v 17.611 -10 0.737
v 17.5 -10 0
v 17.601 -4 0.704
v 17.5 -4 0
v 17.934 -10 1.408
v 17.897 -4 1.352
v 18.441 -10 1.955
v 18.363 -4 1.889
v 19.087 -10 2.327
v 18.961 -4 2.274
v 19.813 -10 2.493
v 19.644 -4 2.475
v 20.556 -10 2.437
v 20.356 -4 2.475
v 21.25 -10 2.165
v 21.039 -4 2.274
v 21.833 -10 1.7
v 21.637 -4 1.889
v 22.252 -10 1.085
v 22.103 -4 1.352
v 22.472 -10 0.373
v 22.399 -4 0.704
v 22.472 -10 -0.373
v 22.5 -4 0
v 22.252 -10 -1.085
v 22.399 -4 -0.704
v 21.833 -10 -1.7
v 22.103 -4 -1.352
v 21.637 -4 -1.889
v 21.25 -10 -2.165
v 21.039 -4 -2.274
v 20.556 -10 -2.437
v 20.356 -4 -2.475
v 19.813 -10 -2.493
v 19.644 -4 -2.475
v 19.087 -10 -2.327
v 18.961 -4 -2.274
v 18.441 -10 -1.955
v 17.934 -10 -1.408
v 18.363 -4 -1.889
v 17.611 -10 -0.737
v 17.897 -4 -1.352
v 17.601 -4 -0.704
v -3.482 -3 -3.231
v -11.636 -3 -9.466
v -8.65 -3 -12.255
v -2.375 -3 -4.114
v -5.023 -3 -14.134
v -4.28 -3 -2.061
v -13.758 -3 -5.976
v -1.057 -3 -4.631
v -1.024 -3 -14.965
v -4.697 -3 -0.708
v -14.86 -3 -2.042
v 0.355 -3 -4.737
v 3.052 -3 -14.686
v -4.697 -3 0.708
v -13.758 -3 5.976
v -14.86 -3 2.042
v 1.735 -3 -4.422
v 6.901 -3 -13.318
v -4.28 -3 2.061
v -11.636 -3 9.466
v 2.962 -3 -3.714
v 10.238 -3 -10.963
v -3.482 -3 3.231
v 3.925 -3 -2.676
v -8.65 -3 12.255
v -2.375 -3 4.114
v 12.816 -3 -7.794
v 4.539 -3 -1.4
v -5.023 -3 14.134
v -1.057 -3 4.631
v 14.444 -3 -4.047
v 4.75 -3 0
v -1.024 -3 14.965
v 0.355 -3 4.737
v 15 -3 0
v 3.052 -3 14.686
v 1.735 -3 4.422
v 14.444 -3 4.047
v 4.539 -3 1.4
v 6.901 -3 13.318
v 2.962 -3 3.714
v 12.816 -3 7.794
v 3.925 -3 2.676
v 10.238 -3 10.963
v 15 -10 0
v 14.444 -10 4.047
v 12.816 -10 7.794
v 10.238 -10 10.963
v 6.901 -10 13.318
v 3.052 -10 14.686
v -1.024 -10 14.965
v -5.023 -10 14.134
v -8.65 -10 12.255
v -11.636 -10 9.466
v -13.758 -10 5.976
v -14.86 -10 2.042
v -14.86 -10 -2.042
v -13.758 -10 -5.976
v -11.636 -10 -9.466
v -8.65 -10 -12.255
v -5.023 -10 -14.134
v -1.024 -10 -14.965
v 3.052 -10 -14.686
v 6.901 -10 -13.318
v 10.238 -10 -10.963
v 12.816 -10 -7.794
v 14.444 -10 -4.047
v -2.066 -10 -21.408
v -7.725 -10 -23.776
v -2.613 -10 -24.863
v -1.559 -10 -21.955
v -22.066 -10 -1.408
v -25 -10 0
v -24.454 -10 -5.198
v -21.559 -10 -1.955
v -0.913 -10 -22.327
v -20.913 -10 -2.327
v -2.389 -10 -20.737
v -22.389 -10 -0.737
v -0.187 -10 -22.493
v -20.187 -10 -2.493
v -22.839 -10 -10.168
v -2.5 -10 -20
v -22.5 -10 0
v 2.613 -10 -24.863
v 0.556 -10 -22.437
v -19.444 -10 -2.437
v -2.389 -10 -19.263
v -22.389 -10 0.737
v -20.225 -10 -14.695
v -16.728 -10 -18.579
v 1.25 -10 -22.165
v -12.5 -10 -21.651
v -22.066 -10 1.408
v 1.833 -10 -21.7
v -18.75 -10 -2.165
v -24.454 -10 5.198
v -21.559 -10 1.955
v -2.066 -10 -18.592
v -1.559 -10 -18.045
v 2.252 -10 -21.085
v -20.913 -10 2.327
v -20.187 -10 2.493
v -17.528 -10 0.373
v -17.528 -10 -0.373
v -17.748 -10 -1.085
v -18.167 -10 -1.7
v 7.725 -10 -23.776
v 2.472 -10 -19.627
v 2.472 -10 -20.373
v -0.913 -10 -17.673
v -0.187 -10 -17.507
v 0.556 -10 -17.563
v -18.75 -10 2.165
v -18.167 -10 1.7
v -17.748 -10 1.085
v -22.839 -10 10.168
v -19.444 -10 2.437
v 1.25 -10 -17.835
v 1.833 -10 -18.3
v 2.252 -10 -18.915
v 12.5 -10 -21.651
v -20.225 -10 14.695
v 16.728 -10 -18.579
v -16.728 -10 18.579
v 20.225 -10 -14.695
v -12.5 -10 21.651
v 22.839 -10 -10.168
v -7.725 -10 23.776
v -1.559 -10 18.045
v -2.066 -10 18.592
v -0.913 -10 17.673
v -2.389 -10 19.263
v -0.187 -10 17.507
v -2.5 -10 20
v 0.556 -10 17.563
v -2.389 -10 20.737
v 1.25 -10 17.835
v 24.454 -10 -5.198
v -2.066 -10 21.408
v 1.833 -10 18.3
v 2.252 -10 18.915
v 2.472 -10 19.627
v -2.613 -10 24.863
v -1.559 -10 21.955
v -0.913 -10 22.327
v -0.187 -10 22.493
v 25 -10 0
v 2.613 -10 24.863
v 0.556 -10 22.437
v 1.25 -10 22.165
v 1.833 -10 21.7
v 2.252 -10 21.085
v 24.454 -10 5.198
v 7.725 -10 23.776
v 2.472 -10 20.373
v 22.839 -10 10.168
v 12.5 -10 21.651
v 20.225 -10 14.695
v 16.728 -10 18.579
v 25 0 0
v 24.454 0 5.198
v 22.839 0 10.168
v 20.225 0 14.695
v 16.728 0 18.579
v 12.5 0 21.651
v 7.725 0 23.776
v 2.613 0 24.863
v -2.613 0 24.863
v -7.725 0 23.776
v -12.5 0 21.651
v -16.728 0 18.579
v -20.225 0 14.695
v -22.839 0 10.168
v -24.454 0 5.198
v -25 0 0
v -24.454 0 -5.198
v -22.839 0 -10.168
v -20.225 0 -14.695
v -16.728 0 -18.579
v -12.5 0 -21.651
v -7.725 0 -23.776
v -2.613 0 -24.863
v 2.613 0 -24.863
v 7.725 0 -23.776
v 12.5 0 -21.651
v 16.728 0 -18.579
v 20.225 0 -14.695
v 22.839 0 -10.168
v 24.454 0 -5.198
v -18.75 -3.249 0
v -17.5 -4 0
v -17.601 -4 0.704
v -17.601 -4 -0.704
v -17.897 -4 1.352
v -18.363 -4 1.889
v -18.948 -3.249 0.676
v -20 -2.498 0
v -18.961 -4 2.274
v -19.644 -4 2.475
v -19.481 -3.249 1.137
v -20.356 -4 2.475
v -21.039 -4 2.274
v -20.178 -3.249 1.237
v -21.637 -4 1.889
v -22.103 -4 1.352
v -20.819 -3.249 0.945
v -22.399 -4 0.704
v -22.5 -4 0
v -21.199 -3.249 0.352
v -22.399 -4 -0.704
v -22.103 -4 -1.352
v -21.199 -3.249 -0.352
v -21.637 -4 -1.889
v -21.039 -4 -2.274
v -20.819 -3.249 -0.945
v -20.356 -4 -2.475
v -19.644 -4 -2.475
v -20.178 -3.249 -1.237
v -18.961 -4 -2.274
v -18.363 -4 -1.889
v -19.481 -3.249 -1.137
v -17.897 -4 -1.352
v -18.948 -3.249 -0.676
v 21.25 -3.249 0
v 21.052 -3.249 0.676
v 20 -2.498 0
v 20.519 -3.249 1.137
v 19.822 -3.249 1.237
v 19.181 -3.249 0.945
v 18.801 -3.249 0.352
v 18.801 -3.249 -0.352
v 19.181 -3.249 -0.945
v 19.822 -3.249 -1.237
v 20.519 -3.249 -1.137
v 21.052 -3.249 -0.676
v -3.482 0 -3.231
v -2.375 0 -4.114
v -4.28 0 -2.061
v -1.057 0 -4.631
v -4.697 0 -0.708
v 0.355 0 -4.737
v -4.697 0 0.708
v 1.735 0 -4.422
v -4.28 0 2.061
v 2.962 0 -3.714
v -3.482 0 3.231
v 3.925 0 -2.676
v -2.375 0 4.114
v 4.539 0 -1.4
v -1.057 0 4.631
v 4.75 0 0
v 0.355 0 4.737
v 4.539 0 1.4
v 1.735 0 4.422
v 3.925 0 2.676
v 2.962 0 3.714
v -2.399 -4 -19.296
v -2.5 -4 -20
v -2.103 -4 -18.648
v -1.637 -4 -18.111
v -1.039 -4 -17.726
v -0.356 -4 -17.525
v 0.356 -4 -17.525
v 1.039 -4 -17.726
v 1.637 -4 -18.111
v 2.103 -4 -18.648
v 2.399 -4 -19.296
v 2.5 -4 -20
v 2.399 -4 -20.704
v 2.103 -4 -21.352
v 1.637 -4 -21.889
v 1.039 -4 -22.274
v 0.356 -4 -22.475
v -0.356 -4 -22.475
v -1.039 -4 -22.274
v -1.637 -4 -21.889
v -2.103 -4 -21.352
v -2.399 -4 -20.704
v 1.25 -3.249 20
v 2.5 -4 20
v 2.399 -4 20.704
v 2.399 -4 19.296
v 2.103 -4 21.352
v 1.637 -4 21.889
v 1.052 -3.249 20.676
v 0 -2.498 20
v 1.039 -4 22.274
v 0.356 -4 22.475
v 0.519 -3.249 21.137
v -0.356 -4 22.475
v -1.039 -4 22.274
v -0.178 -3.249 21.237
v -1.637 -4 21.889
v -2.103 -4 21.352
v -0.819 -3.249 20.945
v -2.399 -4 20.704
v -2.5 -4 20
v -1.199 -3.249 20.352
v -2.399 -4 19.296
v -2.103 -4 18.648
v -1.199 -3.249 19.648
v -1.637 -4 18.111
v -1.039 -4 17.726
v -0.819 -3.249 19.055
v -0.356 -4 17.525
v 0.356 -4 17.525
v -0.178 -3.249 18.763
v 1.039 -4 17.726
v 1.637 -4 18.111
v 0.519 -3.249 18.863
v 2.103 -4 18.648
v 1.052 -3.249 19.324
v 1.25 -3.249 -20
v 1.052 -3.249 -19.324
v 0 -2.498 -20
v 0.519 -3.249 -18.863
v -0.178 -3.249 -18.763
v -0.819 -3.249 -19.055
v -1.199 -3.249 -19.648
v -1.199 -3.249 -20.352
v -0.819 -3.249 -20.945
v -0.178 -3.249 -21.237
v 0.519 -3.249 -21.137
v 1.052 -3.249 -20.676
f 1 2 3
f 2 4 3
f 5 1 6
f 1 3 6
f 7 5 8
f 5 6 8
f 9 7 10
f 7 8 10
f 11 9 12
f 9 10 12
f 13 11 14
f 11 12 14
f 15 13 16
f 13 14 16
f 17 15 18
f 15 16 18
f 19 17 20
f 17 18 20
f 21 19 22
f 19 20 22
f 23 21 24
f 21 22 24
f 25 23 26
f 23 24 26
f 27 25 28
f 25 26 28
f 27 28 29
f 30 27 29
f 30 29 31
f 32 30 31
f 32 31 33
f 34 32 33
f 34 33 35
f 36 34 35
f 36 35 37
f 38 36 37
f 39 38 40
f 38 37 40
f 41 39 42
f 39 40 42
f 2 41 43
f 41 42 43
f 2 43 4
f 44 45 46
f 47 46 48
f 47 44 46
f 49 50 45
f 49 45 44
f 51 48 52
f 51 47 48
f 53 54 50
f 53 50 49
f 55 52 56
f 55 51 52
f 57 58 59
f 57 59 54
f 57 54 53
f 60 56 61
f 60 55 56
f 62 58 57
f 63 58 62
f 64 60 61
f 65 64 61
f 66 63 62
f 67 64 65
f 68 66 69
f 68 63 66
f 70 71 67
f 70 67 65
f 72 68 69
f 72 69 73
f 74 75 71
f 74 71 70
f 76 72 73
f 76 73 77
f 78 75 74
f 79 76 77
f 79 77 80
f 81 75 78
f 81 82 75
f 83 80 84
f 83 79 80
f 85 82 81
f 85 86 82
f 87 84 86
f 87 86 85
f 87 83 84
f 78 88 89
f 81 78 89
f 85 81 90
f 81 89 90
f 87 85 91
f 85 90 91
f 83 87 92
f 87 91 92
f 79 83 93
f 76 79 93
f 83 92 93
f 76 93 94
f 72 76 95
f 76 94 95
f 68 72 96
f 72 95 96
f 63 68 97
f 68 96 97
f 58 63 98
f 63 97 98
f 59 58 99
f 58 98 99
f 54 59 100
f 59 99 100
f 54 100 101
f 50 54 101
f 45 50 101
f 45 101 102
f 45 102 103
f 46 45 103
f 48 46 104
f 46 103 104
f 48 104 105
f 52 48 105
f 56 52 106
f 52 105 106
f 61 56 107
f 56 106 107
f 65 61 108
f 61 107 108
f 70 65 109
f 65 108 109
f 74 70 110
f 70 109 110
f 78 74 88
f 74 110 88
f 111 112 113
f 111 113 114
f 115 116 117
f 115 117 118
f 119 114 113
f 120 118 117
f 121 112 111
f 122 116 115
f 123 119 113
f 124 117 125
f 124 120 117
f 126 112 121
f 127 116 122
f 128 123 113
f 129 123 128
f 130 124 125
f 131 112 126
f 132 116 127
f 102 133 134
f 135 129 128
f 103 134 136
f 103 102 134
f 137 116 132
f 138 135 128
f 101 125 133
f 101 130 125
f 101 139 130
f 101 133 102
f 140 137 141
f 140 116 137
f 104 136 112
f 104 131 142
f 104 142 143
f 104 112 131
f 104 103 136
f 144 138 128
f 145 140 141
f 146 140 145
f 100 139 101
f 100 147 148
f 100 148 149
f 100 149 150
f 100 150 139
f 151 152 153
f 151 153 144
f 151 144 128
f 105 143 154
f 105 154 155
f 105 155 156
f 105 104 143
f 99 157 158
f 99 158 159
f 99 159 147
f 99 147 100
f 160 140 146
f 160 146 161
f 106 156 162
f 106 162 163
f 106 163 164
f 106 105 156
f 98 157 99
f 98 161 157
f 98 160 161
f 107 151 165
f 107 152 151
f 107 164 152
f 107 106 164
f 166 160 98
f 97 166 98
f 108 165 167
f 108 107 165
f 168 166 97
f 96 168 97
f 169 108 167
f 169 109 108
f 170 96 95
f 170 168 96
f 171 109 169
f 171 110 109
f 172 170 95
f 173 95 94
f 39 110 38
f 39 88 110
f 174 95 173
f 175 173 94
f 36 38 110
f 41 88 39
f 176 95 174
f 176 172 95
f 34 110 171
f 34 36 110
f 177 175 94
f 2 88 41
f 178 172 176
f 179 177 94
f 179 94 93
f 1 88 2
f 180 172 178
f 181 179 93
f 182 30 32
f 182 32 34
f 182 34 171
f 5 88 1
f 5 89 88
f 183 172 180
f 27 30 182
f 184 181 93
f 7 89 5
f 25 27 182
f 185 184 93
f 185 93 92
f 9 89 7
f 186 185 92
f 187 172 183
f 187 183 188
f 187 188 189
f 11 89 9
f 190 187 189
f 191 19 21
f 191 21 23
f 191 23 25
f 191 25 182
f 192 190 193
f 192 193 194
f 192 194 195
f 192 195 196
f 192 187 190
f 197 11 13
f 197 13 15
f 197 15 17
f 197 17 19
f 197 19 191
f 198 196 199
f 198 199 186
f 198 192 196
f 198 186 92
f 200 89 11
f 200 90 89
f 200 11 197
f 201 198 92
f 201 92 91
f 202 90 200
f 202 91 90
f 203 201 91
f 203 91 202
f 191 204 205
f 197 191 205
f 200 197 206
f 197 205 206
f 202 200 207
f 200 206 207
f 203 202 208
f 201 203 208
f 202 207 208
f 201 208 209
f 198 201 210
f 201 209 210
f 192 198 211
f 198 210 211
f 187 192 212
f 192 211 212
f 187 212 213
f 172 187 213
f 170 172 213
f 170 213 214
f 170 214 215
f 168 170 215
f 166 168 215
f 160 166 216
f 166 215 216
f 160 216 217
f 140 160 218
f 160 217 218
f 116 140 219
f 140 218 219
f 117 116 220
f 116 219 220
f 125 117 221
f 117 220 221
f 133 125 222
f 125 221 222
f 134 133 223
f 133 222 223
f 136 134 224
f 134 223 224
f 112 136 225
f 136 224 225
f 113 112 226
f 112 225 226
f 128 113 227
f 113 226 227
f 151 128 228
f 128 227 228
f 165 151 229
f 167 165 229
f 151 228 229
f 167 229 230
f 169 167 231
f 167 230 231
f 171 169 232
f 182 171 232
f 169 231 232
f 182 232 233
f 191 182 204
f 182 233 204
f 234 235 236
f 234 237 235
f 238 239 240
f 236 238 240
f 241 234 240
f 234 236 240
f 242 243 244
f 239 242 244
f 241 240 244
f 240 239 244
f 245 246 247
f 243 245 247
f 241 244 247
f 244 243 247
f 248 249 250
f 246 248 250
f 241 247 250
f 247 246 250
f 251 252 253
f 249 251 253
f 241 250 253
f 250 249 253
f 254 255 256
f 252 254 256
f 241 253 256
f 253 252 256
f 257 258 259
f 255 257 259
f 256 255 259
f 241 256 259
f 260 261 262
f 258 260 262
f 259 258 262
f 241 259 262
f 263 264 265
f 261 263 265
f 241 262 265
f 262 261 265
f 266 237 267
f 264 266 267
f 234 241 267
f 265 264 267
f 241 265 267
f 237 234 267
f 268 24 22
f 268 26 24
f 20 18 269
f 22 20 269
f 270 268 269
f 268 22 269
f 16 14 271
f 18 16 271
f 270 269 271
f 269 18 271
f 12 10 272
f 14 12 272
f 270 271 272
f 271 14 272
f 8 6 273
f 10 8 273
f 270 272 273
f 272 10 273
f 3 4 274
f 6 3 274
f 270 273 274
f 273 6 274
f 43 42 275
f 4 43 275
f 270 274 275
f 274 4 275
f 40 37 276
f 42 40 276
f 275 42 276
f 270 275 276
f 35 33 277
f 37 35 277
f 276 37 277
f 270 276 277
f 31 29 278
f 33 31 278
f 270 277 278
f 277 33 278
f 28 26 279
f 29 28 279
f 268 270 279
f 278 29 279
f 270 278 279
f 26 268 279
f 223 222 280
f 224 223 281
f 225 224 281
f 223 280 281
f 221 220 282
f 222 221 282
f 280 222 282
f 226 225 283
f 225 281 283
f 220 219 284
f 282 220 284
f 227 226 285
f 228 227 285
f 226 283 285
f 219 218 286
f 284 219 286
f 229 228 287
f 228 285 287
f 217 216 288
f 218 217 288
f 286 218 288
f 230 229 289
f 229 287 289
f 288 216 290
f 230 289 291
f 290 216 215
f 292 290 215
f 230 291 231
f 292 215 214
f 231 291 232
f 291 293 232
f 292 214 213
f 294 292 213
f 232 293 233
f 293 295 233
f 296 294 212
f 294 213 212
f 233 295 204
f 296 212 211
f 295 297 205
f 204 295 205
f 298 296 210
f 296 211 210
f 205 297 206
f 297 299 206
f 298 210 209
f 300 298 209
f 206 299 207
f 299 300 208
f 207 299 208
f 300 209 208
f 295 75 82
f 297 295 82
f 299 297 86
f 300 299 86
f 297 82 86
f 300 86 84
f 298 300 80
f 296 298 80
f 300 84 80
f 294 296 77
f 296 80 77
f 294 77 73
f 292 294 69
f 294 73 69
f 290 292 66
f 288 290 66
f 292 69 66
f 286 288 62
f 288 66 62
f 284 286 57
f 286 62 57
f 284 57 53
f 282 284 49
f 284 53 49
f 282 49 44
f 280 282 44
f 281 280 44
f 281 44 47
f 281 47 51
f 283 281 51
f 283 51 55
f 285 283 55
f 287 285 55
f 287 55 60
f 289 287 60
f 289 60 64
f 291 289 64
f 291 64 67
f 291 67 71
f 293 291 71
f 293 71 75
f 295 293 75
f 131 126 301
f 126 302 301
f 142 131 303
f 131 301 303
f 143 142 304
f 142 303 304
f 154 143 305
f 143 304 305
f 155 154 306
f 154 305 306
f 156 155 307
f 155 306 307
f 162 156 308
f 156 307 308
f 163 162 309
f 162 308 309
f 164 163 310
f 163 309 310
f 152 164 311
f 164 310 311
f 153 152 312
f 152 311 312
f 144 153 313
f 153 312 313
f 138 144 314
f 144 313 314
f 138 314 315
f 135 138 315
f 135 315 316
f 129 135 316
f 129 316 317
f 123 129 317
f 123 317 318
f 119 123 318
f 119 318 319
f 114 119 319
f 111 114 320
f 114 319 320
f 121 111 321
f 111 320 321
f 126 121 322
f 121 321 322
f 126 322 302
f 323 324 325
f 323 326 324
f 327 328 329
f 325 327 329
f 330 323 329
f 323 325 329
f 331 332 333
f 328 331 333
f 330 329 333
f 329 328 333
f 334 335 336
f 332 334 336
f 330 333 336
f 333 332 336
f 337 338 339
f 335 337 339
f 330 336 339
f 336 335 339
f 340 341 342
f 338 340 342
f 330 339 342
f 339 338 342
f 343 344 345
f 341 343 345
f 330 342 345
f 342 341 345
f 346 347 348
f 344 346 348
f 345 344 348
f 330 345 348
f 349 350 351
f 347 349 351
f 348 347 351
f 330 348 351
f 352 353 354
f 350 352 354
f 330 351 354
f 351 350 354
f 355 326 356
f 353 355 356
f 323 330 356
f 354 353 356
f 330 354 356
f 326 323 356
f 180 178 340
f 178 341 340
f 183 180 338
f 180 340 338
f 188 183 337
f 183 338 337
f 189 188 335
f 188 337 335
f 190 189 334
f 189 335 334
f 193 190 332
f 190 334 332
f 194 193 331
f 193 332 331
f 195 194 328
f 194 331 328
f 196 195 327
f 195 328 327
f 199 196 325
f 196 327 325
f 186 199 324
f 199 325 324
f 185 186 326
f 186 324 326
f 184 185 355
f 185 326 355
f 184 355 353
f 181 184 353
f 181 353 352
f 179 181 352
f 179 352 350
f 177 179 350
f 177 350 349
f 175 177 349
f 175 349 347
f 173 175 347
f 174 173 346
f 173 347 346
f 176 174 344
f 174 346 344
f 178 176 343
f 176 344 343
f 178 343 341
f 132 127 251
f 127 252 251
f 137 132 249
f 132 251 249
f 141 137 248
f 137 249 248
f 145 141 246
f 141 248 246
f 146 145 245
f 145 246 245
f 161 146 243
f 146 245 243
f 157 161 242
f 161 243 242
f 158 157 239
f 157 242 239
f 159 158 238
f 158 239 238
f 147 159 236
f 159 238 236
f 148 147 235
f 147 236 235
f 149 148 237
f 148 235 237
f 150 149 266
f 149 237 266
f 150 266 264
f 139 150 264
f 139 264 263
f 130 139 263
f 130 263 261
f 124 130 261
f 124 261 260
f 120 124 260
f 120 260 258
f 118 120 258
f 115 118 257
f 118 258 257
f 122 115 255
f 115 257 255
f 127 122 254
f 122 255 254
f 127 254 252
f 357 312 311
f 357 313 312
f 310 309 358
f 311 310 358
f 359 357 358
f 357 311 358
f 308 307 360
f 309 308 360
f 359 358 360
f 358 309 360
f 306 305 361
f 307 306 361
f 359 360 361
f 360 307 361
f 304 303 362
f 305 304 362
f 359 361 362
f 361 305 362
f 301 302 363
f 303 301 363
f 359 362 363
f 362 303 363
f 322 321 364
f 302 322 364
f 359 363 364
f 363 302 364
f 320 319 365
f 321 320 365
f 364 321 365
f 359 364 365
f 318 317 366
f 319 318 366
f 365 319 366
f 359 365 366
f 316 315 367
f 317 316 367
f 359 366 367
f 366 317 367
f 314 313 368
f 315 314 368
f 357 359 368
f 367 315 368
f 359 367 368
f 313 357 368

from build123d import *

# Parameters (mm, degrees)
F0_R     = 25
F1_DEPTH = 10
F2_R     = 4.75
F3_DEPTH = 25
F4_R     = 15
F5_DEPTH = 7
F7_D     = 5
F7_DEPTH = 6
F7_TIP   = 1.5021515476


with BuildPart() as f1:
    # F0 (on Front) → F1 (new body)
    with BuildSketch(Plane.XZ):
        Circle(F0_R)
    extrude(amount=F1_DEPTH)

    # F2 (on face) → F3 (cut)
    with BuildSketch(Plane.XZ.offset(10)):
        Circle(F2_R)
    extrude(amount=-F3_DEPTH, mode=Mode.SUBTRACT)

    # F4 (on face) → F5 (cut)
    with BuildSketch(Plane.XZ.offset(10)):
        Circle(F4_R)
    extrude(amount=-F5_DEPTH, mode=Mode.SUBTRACT)

    # F7
    with Locations(Plane.XZ.offset(10)):
        with Locations((0, 20), (20, 0), (0, -20), (-20, 0)):
            Hole(F7_D / 2, depth=F7_DEPTH)
            with Locations((0, 0, -(F7_DEPTH + F7_TIP / 2))):  # 118° drill point
                Cone(0, F7_D / 2, F7_TIP, mode=Mode.SUBTRACT)


solid = f1.part
